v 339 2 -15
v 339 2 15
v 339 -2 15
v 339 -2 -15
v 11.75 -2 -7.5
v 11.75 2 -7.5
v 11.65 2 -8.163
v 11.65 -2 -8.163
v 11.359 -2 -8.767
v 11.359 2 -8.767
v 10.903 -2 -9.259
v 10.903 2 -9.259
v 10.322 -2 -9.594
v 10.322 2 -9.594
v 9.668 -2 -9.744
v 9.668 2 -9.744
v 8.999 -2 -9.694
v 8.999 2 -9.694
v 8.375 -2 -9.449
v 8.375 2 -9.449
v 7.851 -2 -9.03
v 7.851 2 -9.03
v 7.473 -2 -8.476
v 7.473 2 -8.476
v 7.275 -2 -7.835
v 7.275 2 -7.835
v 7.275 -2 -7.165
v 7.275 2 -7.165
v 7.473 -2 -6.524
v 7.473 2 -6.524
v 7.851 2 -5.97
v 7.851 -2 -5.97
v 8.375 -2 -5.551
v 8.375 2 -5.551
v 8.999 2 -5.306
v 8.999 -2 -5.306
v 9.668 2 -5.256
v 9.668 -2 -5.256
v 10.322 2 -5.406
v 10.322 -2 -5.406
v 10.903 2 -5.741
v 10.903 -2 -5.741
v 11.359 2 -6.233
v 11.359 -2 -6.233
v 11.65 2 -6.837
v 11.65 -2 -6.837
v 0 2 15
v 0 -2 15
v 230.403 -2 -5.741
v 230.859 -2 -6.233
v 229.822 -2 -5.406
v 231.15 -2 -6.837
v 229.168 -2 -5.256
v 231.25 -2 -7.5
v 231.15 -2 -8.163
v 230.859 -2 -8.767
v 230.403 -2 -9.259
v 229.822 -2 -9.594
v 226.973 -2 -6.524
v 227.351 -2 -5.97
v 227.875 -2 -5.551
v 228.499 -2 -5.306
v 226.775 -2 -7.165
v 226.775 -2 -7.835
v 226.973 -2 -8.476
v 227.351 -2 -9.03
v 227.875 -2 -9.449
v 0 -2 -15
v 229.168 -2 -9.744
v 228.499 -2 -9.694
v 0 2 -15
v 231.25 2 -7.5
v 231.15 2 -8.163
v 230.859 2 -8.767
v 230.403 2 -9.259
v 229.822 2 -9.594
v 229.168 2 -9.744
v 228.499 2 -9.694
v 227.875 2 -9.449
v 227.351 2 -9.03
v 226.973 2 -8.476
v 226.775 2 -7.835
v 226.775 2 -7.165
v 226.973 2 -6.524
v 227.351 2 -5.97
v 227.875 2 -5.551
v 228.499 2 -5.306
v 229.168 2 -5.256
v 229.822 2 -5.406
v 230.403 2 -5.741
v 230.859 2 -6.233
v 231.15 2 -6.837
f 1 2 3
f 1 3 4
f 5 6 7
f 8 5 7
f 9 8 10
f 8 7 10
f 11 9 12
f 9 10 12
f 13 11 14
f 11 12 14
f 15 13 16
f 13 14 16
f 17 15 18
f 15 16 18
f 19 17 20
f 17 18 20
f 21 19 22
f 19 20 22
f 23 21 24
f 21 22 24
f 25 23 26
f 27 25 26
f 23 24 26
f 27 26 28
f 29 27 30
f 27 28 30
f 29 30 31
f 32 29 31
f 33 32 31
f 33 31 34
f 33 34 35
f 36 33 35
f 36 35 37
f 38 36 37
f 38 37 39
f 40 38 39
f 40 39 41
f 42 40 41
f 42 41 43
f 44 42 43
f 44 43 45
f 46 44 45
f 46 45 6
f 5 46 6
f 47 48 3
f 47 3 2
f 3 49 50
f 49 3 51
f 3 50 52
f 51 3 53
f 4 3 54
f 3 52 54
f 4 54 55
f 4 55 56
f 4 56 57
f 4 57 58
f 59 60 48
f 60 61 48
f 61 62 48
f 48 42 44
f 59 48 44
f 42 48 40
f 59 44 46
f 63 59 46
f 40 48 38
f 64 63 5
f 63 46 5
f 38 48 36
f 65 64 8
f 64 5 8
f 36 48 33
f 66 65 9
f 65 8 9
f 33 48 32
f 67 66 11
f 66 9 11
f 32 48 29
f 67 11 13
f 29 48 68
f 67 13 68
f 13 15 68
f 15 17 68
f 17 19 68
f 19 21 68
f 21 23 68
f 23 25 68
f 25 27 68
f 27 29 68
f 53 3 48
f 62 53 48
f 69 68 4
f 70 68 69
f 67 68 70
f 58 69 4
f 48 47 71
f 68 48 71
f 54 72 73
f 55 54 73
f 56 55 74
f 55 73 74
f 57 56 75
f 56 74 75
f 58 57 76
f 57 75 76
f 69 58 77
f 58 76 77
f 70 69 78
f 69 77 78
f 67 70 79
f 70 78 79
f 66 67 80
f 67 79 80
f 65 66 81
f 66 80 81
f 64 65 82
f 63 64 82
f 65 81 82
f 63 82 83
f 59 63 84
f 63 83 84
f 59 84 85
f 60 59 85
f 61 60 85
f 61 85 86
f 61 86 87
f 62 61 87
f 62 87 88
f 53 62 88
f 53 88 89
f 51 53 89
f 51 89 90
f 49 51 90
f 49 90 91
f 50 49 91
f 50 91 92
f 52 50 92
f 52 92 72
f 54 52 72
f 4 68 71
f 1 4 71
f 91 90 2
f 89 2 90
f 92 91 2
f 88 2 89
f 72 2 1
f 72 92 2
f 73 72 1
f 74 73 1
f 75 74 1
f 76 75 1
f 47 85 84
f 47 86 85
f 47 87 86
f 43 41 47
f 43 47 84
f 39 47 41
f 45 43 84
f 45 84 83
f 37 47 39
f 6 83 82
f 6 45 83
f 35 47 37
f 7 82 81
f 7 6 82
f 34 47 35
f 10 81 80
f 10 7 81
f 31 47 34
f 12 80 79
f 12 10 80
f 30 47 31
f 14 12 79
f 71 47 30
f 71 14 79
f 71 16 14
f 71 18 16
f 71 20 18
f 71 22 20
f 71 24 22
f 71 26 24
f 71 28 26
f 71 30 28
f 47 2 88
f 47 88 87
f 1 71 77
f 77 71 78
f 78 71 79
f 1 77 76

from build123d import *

# Parameters (mm, degrees)
SKETCH_1_W          = 30
SKETCH_1_H          = 4
EXTRUDE_1_DEPTH     = 339
SKETCH_2_R          = 2.25
CUT_EXTRUDE_1_DEPTH = 5


with BuildPart() as part:
    # Эскиз1 → Бобышка-Вытянуть1 (new body)
    with BuildSketch(Plane(origin=(0, 0, 0), x_dir=(0, 0, -1), z_dir=(1, 0, 0))):
        Rectangle(SKETCH_1_W, SKETCH_1_H)
    extrude(amount=EXTRUDE_1_DEPTH)

    # Эскиз2 → Вырез-Вытянуть1 (cut, through all)
    with BuildSketch(Plane(origin=(0, 2, 0), x_dir=(1, 0, 0), z_dir=(0, 1, 0))):
        with Locations((9.5, 7.5)):
            Circle(SKETCH_2_R)
        with Locations((229, 7.5)):
            Circle(SKETCH_2_R)
    extrude(amount=-CUT_EXTRUDE_1_DEPTH, mode=Mode.SUBTRACT)


solid = part.part
